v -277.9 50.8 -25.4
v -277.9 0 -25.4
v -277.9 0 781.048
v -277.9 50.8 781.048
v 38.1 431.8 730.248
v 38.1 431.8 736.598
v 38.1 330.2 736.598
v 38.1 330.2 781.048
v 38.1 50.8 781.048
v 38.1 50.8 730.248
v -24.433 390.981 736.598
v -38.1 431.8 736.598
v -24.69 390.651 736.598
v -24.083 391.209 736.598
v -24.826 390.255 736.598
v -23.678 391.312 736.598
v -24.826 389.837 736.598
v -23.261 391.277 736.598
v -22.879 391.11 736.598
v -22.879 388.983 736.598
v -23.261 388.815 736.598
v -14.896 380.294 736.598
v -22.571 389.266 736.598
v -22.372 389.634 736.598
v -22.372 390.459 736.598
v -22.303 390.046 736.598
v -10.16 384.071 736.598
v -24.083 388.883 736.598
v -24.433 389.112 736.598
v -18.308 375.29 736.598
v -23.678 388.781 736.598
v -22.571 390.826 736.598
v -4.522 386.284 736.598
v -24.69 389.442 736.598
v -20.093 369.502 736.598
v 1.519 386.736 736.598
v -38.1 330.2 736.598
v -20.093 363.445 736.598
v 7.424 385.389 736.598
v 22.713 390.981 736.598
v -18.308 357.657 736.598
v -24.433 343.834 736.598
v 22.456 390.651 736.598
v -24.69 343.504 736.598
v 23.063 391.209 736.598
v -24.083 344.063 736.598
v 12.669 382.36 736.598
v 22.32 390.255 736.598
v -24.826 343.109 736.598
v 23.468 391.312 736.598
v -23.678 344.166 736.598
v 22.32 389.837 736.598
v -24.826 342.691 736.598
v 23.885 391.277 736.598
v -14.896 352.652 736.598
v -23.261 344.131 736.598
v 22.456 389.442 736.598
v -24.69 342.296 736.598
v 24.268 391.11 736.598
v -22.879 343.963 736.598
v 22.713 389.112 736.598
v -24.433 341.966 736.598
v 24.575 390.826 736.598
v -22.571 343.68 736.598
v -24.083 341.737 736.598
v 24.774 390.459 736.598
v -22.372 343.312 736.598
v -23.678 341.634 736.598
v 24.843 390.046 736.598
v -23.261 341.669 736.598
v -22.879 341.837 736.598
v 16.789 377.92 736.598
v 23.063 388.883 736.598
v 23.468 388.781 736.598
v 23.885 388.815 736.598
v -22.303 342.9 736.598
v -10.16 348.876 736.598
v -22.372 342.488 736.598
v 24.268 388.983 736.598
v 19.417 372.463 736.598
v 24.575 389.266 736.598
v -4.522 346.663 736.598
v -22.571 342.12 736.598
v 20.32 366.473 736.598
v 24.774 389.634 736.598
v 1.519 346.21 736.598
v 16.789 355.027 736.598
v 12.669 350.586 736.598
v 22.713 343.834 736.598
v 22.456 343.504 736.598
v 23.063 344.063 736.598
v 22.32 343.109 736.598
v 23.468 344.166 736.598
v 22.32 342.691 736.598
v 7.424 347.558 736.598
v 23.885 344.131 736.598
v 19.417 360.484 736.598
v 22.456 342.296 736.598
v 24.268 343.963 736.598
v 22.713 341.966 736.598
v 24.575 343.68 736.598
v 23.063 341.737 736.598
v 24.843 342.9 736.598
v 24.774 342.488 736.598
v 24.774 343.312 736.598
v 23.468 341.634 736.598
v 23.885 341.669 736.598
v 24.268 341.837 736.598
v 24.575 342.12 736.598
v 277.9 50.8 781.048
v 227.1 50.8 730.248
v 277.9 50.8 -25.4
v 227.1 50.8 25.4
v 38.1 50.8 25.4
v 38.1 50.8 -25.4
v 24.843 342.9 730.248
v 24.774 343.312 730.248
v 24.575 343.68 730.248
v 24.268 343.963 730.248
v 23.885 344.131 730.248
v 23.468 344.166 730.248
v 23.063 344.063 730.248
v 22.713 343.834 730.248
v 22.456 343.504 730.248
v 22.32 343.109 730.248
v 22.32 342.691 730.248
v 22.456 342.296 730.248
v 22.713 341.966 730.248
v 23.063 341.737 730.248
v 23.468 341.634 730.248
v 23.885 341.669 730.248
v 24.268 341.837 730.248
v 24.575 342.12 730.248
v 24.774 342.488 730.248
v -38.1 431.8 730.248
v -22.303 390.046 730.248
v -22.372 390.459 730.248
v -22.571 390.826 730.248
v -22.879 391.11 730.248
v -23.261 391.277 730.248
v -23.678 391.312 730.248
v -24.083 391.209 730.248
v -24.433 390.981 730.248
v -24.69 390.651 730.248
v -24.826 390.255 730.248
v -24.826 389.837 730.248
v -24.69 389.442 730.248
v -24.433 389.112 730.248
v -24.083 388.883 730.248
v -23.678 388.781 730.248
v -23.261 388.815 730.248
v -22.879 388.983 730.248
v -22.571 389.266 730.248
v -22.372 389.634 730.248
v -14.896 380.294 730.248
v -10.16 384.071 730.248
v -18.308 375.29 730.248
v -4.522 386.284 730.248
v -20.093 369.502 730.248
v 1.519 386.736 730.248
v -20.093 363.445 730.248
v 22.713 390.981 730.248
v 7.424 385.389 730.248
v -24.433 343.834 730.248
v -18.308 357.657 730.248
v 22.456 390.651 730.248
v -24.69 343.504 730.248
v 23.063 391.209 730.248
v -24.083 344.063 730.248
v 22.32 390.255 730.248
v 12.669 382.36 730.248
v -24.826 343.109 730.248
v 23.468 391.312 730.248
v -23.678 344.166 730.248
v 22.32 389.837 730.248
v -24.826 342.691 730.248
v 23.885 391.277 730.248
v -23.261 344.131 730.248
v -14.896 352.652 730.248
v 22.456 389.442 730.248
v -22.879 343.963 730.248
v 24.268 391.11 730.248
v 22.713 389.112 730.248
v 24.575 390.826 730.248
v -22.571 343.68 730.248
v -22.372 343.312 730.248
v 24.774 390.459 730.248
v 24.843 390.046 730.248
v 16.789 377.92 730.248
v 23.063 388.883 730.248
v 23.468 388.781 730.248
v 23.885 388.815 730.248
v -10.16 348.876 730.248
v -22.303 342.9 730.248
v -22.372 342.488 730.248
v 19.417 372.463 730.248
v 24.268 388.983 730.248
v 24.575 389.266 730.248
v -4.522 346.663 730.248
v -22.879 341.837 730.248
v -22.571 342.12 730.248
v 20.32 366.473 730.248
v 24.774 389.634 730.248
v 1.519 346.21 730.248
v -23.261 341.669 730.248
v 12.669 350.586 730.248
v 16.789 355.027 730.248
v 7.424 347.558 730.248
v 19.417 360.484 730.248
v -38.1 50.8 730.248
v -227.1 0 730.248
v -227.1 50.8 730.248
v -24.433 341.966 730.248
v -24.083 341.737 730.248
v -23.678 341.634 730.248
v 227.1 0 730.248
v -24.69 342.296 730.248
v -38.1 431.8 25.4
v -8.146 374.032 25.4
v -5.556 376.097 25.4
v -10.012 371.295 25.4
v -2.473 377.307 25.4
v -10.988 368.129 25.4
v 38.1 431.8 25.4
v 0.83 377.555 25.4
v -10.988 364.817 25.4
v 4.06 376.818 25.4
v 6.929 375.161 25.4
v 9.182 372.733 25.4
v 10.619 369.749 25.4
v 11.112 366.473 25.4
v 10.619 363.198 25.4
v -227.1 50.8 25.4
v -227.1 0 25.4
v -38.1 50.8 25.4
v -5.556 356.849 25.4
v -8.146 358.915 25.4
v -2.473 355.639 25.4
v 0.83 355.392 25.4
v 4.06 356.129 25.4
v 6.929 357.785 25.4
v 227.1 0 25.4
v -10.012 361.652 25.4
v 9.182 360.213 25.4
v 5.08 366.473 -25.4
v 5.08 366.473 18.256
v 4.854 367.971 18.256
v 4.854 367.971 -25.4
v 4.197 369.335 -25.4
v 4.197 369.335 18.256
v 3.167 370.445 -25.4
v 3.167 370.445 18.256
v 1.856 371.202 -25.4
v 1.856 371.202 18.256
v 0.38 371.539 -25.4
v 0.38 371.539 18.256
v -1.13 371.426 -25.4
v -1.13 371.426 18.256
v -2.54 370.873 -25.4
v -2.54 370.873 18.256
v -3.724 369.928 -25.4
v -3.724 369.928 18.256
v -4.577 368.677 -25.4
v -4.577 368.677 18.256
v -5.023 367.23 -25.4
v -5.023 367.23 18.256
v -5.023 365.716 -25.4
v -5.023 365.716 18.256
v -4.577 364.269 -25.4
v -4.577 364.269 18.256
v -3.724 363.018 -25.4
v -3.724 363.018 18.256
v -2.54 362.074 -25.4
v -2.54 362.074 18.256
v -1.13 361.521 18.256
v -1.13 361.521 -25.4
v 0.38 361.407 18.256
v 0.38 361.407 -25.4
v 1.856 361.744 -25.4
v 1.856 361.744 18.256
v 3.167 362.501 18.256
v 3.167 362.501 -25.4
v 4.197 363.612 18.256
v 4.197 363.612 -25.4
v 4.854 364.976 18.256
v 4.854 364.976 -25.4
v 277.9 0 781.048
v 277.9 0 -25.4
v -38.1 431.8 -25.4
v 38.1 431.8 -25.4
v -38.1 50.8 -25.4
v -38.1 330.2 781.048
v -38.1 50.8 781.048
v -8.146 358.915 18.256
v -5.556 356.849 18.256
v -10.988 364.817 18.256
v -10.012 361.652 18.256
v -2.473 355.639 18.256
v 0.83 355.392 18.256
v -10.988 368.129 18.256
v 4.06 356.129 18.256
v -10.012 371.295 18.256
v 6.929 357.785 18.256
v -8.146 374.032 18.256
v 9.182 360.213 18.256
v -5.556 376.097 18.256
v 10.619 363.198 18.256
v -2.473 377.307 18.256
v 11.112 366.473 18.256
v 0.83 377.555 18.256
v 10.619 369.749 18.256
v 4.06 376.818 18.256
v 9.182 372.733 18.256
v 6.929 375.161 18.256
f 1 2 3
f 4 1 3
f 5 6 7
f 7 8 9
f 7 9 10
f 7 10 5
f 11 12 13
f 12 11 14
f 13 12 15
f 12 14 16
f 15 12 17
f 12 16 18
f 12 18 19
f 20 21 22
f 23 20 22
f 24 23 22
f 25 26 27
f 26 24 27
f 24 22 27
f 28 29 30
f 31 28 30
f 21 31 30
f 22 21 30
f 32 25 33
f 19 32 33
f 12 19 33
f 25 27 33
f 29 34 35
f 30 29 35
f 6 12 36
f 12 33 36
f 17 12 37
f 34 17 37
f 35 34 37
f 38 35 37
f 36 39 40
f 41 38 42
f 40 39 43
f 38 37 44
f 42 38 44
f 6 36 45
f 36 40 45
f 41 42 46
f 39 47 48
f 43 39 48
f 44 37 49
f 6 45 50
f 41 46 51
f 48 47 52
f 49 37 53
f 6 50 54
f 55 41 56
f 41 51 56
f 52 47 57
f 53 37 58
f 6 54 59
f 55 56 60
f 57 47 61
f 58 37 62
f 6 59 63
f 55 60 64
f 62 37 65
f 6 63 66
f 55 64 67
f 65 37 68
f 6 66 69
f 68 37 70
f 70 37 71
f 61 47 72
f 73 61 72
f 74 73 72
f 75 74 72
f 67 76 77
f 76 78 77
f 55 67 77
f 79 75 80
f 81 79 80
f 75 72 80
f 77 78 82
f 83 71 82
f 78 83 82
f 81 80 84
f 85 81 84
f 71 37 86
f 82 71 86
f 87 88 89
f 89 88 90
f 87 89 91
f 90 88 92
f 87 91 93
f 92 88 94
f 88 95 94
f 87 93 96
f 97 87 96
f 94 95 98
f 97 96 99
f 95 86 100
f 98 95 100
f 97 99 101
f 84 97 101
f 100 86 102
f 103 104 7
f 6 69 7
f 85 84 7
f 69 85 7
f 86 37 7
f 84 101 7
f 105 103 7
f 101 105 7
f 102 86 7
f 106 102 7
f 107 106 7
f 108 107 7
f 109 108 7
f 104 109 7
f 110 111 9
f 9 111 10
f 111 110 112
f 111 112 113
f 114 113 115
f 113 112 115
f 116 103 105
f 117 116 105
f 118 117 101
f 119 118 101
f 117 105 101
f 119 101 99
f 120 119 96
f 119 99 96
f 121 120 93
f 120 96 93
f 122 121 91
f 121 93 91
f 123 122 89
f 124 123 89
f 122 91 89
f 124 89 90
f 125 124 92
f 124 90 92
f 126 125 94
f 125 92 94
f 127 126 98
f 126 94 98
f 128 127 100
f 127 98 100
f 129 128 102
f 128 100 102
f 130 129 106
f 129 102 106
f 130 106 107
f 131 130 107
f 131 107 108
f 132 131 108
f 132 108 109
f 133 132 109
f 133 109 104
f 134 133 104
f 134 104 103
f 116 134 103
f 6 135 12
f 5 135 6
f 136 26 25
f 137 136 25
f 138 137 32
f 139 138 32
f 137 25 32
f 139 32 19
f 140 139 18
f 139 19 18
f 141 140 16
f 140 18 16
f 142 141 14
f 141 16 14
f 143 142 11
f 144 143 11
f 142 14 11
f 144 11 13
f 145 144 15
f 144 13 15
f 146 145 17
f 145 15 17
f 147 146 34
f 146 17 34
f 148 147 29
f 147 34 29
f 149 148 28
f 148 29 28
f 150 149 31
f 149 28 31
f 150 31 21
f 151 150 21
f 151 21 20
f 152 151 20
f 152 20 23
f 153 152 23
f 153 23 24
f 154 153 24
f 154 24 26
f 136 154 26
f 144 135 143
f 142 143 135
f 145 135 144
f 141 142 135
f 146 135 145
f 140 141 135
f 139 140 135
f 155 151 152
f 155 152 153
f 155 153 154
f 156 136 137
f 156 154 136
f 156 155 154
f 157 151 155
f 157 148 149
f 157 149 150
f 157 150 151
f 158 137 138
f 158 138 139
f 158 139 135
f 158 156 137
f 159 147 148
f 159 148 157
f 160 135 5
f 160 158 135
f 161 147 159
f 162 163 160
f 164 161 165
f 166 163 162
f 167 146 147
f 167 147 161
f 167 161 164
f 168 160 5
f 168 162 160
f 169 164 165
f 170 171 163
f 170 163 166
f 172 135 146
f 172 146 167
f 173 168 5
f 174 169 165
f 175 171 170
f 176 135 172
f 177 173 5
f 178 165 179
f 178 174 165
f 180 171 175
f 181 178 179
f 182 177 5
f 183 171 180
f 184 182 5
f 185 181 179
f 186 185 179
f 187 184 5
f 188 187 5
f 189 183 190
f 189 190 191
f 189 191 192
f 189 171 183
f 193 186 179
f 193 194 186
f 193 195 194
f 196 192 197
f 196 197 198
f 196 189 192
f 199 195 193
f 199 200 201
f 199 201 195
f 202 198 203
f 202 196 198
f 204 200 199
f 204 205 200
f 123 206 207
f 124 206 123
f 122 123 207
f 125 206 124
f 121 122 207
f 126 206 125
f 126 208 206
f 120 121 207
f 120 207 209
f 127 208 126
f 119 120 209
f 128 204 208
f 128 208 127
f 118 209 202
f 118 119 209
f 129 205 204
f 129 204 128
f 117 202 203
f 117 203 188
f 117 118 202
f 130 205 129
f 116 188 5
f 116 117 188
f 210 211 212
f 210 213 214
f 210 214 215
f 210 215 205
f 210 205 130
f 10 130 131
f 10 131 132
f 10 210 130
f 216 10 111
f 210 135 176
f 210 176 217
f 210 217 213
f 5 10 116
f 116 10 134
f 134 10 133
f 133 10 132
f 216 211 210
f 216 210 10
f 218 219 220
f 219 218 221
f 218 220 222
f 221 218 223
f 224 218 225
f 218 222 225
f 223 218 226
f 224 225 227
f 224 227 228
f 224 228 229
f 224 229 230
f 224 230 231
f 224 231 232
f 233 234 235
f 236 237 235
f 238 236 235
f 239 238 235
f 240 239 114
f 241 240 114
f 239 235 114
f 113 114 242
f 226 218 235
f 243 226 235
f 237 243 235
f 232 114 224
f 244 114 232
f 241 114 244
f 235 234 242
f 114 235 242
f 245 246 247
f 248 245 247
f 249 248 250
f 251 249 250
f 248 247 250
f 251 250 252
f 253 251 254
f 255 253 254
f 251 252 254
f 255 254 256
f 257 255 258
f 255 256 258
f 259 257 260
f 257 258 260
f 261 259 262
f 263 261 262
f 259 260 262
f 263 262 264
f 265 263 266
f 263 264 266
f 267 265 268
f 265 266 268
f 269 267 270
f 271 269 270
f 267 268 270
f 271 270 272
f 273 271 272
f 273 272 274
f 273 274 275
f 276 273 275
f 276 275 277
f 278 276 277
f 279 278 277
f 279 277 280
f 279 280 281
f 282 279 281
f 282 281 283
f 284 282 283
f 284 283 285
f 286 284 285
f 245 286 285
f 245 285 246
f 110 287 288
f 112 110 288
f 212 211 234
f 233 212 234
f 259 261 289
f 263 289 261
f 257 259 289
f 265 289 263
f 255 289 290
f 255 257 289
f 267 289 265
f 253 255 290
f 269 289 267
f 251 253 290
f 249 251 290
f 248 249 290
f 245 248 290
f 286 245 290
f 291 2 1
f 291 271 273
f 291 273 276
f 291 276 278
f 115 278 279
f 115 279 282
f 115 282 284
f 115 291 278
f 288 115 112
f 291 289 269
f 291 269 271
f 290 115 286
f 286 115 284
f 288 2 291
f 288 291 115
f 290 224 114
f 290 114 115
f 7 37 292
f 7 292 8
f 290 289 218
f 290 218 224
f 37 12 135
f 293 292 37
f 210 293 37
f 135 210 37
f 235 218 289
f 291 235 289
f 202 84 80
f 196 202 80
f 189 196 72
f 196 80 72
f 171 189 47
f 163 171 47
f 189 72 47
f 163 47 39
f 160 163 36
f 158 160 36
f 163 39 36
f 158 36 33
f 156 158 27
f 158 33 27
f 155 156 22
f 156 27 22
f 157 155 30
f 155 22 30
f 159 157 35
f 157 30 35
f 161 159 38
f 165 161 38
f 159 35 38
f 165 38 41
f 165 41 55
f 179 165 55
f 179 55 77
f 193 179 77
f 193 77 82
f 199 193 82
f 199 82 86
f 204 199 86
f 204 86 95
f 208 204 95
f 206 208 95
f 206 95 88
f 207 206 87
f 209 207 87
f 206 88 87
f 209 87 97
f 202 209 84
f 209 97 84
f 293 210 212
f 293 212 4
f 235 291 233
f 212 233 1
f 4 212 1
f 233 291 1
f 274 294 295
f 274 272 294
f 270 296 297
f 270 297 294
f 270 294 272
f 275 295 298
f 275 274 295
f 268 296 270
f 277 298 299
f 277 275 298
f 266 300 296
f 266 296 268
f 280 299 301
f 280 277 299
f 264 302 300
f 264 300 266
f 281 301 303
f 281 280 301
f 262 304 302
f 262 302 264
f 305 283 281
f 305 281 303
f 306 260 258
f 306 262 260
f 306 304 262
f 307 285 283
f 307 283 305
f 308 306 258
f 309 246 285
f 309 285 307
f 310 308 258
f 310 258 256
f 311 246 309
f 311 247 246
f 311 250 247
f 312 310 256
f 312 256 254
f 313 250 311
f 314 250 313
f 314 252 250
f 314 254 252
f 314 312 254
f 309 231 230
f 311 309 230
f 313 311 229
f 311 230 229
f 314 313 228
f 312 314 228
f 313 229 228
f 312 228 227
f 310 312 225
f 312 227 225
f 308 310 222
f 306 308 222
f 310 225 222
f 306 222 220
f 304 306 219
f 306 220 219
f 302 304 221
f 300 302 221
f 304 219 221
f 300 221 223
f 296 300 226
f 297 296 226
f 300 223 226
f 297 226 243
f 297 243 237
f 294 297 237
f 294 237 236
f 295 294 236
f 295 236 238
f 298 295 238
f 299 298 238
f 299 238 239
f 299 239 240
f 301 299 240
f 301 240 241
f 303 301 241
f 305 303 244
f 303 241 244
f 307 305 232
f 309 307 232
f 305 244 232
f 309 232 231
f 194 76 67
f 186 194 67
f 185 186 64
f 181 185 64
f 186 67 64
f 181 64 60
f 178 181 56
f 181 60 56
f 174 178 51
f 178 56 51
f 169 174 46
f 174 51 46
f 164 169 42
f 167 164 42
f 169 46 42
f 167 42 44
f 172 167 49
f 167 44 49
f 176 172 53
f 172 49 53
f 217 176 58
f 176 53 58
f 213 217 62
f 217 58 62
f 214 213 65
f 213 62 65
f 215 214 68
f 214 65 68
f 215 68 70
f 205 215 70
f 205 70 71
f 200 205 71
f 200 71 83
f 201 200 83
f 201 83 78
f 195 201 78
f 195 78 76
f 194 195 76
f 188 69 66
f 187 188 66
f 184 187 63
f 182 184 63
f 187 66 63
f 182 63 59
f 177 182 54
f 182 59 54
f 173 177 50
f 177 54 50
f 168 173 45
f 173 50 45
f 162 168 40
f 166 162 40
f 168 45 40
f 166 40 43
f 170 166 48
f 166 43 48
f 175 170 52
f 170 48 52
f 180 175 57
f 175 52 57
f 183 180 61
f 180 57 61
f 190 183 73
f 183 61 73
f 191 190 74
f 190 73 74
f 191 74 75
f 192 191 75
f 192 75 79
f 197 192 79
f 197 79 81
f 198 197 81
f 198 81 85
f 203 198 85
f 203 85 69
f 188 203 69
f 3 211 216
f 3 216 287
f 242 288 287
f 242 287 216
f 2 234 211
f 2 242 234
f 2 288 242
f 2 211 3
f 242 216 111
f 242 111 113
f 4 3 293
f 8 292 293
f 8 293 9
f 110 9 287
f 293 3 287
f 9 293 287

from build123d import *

# Parameters (mm, degrees)
SKETCH1_W           = 454.199999904
SKETCH1_H           = 704.848240034
BOSS_EXTRUDE1_DEPTH = 50.8
SKETCH2_W           = 76.2
SKETCH2_H           = 50.8
BOSS_EXTRUDE2_DEPTH = 279.4
SKETCH4_W           = 76.2
SKETCH4_H           = 50.8
BOSS_EXTRUDE3_DEPTH = 381
SKETCH5_W           = 76.2
SKETCH5_H           = 6.35
BOSS_EXTRUDE4_DEPTH = 101.6
SKETCH6_R           = 1.27
SKETCH6_R_2         = 20.32
CUT_EXTRUDE2_DEPTH  = 6.35
SKETCH8_R           = 11.1125
CUT_EXTRUDE4_DEPTH  = 7.14375
SKETCH9_R           = 5.08
CUT_EXTRUDE5_DEPTH  = 50.8


with BuildPart() as part:
    # Sketch1 → Boss-Extrude1 (new body)
    with BuildSketch(Plane(origin=(0, 0, 0), x_dir=(1, 0, 0), z_dir=(0, 1, 0))):
        Polygon((-277.899999952, 25.4), (277.899999952, 25.4), (277.899999952, -25.4), (277.899999952, -781.048240034), (227.099999952, -781.048240034), (-227.099999952, -781.048240034), (-277.899999952, -781.048240034), (-277.899999952, -25.4), align=None)
        with Locations((0, -377.824120017)):
            Rectangle(SKETCH1_W, SKETCH1_H, mode=Mode.SUBTRACT)
    extrude(amount=BOSS_EXTRUDE1_DEPTH)

    # Sketch2 → Boss-Extrude2 (add)
    with BuildSketch(Plane(origin=(0, 50.8, 0), x_dir=(1, 0, 0), z_dir=(0, 1, 0))):
        with Locations((0, -755.648240034)):
            Rectangle(SKETCH2_W, SKETCH2_H)
    extrude(amount=BOSS_EXTRUDE2_DEPTH)

    # Sketch4 → Boss-Extrude3 (add)
    with BuildSketch(Plane(origin=(0, 50.8, 0), x_dir=(1, 0, 0), z_dir=(0, 1, 0))):
        Rectangle(SKETCH4_W, SKETCH4_H)
    extrude(amount=BOSS_EXTRUDE3_DEPTH)

    # Sketch5 → Boss-Extrude4 (add)
    with BuildSketch(Plane(origin=(0, 330.2, 0), x_dir=(1, 0, 0), z_dir=(0, 1, 0))):
        with Locations((0, -733.423240034)):
            Rectangle(SKETCH5_W, SKETCH5_H)
    extrude(amount=BOSS_EXTRUDE4_DEPTH)

    # Sketch6 → Cut-Extrude2 (cut)
    with BuildSketch(Plane.XY.offset(736.598240034)):
        with Locations((-23.57317231, 390.04634462)):
            Circle(SKETCH6_R)
        with Locations((-23.57317231, 342.9)):
            Circle(SKETCH6_R)
        with Locations((23.57317231, 390.04634462)):
            Circle(SKETCH6_R)
        with Locations((23.57317231, 342.9)):
            Circle(SKETCH6_R)
        with Locations((0, 366.47317231)):
            Circle(SKETCH6_R_2)
    extrude(amount=-CUT_EXTRUDE2_DEPTH, mode=Mode.SUBTRACT)

    # Sketch8 → Cut-Extrude4 (cut)
    with BuildSketch(Plane.XY.offset(25.4)):
        with Locations((0, 366.47317231)):
            Circle(SKETCH8_R)
    extrude(amount=-CUT_EXTRUDE4_DEPTH, mode=Mode.SUBTRACT)

    # Sketch9 → Cut-Extrude5 (cut)
    with BuildSketch(Plane.XY.offset(18.25625)):
        with Locations((0, 366.47317231)):
            Circle(SKETCH9_R)
    extrude(amount=-CUT_EXTRUDE5_DEPTH, mode=Mode.SUBTRACT)


solid = part.part
